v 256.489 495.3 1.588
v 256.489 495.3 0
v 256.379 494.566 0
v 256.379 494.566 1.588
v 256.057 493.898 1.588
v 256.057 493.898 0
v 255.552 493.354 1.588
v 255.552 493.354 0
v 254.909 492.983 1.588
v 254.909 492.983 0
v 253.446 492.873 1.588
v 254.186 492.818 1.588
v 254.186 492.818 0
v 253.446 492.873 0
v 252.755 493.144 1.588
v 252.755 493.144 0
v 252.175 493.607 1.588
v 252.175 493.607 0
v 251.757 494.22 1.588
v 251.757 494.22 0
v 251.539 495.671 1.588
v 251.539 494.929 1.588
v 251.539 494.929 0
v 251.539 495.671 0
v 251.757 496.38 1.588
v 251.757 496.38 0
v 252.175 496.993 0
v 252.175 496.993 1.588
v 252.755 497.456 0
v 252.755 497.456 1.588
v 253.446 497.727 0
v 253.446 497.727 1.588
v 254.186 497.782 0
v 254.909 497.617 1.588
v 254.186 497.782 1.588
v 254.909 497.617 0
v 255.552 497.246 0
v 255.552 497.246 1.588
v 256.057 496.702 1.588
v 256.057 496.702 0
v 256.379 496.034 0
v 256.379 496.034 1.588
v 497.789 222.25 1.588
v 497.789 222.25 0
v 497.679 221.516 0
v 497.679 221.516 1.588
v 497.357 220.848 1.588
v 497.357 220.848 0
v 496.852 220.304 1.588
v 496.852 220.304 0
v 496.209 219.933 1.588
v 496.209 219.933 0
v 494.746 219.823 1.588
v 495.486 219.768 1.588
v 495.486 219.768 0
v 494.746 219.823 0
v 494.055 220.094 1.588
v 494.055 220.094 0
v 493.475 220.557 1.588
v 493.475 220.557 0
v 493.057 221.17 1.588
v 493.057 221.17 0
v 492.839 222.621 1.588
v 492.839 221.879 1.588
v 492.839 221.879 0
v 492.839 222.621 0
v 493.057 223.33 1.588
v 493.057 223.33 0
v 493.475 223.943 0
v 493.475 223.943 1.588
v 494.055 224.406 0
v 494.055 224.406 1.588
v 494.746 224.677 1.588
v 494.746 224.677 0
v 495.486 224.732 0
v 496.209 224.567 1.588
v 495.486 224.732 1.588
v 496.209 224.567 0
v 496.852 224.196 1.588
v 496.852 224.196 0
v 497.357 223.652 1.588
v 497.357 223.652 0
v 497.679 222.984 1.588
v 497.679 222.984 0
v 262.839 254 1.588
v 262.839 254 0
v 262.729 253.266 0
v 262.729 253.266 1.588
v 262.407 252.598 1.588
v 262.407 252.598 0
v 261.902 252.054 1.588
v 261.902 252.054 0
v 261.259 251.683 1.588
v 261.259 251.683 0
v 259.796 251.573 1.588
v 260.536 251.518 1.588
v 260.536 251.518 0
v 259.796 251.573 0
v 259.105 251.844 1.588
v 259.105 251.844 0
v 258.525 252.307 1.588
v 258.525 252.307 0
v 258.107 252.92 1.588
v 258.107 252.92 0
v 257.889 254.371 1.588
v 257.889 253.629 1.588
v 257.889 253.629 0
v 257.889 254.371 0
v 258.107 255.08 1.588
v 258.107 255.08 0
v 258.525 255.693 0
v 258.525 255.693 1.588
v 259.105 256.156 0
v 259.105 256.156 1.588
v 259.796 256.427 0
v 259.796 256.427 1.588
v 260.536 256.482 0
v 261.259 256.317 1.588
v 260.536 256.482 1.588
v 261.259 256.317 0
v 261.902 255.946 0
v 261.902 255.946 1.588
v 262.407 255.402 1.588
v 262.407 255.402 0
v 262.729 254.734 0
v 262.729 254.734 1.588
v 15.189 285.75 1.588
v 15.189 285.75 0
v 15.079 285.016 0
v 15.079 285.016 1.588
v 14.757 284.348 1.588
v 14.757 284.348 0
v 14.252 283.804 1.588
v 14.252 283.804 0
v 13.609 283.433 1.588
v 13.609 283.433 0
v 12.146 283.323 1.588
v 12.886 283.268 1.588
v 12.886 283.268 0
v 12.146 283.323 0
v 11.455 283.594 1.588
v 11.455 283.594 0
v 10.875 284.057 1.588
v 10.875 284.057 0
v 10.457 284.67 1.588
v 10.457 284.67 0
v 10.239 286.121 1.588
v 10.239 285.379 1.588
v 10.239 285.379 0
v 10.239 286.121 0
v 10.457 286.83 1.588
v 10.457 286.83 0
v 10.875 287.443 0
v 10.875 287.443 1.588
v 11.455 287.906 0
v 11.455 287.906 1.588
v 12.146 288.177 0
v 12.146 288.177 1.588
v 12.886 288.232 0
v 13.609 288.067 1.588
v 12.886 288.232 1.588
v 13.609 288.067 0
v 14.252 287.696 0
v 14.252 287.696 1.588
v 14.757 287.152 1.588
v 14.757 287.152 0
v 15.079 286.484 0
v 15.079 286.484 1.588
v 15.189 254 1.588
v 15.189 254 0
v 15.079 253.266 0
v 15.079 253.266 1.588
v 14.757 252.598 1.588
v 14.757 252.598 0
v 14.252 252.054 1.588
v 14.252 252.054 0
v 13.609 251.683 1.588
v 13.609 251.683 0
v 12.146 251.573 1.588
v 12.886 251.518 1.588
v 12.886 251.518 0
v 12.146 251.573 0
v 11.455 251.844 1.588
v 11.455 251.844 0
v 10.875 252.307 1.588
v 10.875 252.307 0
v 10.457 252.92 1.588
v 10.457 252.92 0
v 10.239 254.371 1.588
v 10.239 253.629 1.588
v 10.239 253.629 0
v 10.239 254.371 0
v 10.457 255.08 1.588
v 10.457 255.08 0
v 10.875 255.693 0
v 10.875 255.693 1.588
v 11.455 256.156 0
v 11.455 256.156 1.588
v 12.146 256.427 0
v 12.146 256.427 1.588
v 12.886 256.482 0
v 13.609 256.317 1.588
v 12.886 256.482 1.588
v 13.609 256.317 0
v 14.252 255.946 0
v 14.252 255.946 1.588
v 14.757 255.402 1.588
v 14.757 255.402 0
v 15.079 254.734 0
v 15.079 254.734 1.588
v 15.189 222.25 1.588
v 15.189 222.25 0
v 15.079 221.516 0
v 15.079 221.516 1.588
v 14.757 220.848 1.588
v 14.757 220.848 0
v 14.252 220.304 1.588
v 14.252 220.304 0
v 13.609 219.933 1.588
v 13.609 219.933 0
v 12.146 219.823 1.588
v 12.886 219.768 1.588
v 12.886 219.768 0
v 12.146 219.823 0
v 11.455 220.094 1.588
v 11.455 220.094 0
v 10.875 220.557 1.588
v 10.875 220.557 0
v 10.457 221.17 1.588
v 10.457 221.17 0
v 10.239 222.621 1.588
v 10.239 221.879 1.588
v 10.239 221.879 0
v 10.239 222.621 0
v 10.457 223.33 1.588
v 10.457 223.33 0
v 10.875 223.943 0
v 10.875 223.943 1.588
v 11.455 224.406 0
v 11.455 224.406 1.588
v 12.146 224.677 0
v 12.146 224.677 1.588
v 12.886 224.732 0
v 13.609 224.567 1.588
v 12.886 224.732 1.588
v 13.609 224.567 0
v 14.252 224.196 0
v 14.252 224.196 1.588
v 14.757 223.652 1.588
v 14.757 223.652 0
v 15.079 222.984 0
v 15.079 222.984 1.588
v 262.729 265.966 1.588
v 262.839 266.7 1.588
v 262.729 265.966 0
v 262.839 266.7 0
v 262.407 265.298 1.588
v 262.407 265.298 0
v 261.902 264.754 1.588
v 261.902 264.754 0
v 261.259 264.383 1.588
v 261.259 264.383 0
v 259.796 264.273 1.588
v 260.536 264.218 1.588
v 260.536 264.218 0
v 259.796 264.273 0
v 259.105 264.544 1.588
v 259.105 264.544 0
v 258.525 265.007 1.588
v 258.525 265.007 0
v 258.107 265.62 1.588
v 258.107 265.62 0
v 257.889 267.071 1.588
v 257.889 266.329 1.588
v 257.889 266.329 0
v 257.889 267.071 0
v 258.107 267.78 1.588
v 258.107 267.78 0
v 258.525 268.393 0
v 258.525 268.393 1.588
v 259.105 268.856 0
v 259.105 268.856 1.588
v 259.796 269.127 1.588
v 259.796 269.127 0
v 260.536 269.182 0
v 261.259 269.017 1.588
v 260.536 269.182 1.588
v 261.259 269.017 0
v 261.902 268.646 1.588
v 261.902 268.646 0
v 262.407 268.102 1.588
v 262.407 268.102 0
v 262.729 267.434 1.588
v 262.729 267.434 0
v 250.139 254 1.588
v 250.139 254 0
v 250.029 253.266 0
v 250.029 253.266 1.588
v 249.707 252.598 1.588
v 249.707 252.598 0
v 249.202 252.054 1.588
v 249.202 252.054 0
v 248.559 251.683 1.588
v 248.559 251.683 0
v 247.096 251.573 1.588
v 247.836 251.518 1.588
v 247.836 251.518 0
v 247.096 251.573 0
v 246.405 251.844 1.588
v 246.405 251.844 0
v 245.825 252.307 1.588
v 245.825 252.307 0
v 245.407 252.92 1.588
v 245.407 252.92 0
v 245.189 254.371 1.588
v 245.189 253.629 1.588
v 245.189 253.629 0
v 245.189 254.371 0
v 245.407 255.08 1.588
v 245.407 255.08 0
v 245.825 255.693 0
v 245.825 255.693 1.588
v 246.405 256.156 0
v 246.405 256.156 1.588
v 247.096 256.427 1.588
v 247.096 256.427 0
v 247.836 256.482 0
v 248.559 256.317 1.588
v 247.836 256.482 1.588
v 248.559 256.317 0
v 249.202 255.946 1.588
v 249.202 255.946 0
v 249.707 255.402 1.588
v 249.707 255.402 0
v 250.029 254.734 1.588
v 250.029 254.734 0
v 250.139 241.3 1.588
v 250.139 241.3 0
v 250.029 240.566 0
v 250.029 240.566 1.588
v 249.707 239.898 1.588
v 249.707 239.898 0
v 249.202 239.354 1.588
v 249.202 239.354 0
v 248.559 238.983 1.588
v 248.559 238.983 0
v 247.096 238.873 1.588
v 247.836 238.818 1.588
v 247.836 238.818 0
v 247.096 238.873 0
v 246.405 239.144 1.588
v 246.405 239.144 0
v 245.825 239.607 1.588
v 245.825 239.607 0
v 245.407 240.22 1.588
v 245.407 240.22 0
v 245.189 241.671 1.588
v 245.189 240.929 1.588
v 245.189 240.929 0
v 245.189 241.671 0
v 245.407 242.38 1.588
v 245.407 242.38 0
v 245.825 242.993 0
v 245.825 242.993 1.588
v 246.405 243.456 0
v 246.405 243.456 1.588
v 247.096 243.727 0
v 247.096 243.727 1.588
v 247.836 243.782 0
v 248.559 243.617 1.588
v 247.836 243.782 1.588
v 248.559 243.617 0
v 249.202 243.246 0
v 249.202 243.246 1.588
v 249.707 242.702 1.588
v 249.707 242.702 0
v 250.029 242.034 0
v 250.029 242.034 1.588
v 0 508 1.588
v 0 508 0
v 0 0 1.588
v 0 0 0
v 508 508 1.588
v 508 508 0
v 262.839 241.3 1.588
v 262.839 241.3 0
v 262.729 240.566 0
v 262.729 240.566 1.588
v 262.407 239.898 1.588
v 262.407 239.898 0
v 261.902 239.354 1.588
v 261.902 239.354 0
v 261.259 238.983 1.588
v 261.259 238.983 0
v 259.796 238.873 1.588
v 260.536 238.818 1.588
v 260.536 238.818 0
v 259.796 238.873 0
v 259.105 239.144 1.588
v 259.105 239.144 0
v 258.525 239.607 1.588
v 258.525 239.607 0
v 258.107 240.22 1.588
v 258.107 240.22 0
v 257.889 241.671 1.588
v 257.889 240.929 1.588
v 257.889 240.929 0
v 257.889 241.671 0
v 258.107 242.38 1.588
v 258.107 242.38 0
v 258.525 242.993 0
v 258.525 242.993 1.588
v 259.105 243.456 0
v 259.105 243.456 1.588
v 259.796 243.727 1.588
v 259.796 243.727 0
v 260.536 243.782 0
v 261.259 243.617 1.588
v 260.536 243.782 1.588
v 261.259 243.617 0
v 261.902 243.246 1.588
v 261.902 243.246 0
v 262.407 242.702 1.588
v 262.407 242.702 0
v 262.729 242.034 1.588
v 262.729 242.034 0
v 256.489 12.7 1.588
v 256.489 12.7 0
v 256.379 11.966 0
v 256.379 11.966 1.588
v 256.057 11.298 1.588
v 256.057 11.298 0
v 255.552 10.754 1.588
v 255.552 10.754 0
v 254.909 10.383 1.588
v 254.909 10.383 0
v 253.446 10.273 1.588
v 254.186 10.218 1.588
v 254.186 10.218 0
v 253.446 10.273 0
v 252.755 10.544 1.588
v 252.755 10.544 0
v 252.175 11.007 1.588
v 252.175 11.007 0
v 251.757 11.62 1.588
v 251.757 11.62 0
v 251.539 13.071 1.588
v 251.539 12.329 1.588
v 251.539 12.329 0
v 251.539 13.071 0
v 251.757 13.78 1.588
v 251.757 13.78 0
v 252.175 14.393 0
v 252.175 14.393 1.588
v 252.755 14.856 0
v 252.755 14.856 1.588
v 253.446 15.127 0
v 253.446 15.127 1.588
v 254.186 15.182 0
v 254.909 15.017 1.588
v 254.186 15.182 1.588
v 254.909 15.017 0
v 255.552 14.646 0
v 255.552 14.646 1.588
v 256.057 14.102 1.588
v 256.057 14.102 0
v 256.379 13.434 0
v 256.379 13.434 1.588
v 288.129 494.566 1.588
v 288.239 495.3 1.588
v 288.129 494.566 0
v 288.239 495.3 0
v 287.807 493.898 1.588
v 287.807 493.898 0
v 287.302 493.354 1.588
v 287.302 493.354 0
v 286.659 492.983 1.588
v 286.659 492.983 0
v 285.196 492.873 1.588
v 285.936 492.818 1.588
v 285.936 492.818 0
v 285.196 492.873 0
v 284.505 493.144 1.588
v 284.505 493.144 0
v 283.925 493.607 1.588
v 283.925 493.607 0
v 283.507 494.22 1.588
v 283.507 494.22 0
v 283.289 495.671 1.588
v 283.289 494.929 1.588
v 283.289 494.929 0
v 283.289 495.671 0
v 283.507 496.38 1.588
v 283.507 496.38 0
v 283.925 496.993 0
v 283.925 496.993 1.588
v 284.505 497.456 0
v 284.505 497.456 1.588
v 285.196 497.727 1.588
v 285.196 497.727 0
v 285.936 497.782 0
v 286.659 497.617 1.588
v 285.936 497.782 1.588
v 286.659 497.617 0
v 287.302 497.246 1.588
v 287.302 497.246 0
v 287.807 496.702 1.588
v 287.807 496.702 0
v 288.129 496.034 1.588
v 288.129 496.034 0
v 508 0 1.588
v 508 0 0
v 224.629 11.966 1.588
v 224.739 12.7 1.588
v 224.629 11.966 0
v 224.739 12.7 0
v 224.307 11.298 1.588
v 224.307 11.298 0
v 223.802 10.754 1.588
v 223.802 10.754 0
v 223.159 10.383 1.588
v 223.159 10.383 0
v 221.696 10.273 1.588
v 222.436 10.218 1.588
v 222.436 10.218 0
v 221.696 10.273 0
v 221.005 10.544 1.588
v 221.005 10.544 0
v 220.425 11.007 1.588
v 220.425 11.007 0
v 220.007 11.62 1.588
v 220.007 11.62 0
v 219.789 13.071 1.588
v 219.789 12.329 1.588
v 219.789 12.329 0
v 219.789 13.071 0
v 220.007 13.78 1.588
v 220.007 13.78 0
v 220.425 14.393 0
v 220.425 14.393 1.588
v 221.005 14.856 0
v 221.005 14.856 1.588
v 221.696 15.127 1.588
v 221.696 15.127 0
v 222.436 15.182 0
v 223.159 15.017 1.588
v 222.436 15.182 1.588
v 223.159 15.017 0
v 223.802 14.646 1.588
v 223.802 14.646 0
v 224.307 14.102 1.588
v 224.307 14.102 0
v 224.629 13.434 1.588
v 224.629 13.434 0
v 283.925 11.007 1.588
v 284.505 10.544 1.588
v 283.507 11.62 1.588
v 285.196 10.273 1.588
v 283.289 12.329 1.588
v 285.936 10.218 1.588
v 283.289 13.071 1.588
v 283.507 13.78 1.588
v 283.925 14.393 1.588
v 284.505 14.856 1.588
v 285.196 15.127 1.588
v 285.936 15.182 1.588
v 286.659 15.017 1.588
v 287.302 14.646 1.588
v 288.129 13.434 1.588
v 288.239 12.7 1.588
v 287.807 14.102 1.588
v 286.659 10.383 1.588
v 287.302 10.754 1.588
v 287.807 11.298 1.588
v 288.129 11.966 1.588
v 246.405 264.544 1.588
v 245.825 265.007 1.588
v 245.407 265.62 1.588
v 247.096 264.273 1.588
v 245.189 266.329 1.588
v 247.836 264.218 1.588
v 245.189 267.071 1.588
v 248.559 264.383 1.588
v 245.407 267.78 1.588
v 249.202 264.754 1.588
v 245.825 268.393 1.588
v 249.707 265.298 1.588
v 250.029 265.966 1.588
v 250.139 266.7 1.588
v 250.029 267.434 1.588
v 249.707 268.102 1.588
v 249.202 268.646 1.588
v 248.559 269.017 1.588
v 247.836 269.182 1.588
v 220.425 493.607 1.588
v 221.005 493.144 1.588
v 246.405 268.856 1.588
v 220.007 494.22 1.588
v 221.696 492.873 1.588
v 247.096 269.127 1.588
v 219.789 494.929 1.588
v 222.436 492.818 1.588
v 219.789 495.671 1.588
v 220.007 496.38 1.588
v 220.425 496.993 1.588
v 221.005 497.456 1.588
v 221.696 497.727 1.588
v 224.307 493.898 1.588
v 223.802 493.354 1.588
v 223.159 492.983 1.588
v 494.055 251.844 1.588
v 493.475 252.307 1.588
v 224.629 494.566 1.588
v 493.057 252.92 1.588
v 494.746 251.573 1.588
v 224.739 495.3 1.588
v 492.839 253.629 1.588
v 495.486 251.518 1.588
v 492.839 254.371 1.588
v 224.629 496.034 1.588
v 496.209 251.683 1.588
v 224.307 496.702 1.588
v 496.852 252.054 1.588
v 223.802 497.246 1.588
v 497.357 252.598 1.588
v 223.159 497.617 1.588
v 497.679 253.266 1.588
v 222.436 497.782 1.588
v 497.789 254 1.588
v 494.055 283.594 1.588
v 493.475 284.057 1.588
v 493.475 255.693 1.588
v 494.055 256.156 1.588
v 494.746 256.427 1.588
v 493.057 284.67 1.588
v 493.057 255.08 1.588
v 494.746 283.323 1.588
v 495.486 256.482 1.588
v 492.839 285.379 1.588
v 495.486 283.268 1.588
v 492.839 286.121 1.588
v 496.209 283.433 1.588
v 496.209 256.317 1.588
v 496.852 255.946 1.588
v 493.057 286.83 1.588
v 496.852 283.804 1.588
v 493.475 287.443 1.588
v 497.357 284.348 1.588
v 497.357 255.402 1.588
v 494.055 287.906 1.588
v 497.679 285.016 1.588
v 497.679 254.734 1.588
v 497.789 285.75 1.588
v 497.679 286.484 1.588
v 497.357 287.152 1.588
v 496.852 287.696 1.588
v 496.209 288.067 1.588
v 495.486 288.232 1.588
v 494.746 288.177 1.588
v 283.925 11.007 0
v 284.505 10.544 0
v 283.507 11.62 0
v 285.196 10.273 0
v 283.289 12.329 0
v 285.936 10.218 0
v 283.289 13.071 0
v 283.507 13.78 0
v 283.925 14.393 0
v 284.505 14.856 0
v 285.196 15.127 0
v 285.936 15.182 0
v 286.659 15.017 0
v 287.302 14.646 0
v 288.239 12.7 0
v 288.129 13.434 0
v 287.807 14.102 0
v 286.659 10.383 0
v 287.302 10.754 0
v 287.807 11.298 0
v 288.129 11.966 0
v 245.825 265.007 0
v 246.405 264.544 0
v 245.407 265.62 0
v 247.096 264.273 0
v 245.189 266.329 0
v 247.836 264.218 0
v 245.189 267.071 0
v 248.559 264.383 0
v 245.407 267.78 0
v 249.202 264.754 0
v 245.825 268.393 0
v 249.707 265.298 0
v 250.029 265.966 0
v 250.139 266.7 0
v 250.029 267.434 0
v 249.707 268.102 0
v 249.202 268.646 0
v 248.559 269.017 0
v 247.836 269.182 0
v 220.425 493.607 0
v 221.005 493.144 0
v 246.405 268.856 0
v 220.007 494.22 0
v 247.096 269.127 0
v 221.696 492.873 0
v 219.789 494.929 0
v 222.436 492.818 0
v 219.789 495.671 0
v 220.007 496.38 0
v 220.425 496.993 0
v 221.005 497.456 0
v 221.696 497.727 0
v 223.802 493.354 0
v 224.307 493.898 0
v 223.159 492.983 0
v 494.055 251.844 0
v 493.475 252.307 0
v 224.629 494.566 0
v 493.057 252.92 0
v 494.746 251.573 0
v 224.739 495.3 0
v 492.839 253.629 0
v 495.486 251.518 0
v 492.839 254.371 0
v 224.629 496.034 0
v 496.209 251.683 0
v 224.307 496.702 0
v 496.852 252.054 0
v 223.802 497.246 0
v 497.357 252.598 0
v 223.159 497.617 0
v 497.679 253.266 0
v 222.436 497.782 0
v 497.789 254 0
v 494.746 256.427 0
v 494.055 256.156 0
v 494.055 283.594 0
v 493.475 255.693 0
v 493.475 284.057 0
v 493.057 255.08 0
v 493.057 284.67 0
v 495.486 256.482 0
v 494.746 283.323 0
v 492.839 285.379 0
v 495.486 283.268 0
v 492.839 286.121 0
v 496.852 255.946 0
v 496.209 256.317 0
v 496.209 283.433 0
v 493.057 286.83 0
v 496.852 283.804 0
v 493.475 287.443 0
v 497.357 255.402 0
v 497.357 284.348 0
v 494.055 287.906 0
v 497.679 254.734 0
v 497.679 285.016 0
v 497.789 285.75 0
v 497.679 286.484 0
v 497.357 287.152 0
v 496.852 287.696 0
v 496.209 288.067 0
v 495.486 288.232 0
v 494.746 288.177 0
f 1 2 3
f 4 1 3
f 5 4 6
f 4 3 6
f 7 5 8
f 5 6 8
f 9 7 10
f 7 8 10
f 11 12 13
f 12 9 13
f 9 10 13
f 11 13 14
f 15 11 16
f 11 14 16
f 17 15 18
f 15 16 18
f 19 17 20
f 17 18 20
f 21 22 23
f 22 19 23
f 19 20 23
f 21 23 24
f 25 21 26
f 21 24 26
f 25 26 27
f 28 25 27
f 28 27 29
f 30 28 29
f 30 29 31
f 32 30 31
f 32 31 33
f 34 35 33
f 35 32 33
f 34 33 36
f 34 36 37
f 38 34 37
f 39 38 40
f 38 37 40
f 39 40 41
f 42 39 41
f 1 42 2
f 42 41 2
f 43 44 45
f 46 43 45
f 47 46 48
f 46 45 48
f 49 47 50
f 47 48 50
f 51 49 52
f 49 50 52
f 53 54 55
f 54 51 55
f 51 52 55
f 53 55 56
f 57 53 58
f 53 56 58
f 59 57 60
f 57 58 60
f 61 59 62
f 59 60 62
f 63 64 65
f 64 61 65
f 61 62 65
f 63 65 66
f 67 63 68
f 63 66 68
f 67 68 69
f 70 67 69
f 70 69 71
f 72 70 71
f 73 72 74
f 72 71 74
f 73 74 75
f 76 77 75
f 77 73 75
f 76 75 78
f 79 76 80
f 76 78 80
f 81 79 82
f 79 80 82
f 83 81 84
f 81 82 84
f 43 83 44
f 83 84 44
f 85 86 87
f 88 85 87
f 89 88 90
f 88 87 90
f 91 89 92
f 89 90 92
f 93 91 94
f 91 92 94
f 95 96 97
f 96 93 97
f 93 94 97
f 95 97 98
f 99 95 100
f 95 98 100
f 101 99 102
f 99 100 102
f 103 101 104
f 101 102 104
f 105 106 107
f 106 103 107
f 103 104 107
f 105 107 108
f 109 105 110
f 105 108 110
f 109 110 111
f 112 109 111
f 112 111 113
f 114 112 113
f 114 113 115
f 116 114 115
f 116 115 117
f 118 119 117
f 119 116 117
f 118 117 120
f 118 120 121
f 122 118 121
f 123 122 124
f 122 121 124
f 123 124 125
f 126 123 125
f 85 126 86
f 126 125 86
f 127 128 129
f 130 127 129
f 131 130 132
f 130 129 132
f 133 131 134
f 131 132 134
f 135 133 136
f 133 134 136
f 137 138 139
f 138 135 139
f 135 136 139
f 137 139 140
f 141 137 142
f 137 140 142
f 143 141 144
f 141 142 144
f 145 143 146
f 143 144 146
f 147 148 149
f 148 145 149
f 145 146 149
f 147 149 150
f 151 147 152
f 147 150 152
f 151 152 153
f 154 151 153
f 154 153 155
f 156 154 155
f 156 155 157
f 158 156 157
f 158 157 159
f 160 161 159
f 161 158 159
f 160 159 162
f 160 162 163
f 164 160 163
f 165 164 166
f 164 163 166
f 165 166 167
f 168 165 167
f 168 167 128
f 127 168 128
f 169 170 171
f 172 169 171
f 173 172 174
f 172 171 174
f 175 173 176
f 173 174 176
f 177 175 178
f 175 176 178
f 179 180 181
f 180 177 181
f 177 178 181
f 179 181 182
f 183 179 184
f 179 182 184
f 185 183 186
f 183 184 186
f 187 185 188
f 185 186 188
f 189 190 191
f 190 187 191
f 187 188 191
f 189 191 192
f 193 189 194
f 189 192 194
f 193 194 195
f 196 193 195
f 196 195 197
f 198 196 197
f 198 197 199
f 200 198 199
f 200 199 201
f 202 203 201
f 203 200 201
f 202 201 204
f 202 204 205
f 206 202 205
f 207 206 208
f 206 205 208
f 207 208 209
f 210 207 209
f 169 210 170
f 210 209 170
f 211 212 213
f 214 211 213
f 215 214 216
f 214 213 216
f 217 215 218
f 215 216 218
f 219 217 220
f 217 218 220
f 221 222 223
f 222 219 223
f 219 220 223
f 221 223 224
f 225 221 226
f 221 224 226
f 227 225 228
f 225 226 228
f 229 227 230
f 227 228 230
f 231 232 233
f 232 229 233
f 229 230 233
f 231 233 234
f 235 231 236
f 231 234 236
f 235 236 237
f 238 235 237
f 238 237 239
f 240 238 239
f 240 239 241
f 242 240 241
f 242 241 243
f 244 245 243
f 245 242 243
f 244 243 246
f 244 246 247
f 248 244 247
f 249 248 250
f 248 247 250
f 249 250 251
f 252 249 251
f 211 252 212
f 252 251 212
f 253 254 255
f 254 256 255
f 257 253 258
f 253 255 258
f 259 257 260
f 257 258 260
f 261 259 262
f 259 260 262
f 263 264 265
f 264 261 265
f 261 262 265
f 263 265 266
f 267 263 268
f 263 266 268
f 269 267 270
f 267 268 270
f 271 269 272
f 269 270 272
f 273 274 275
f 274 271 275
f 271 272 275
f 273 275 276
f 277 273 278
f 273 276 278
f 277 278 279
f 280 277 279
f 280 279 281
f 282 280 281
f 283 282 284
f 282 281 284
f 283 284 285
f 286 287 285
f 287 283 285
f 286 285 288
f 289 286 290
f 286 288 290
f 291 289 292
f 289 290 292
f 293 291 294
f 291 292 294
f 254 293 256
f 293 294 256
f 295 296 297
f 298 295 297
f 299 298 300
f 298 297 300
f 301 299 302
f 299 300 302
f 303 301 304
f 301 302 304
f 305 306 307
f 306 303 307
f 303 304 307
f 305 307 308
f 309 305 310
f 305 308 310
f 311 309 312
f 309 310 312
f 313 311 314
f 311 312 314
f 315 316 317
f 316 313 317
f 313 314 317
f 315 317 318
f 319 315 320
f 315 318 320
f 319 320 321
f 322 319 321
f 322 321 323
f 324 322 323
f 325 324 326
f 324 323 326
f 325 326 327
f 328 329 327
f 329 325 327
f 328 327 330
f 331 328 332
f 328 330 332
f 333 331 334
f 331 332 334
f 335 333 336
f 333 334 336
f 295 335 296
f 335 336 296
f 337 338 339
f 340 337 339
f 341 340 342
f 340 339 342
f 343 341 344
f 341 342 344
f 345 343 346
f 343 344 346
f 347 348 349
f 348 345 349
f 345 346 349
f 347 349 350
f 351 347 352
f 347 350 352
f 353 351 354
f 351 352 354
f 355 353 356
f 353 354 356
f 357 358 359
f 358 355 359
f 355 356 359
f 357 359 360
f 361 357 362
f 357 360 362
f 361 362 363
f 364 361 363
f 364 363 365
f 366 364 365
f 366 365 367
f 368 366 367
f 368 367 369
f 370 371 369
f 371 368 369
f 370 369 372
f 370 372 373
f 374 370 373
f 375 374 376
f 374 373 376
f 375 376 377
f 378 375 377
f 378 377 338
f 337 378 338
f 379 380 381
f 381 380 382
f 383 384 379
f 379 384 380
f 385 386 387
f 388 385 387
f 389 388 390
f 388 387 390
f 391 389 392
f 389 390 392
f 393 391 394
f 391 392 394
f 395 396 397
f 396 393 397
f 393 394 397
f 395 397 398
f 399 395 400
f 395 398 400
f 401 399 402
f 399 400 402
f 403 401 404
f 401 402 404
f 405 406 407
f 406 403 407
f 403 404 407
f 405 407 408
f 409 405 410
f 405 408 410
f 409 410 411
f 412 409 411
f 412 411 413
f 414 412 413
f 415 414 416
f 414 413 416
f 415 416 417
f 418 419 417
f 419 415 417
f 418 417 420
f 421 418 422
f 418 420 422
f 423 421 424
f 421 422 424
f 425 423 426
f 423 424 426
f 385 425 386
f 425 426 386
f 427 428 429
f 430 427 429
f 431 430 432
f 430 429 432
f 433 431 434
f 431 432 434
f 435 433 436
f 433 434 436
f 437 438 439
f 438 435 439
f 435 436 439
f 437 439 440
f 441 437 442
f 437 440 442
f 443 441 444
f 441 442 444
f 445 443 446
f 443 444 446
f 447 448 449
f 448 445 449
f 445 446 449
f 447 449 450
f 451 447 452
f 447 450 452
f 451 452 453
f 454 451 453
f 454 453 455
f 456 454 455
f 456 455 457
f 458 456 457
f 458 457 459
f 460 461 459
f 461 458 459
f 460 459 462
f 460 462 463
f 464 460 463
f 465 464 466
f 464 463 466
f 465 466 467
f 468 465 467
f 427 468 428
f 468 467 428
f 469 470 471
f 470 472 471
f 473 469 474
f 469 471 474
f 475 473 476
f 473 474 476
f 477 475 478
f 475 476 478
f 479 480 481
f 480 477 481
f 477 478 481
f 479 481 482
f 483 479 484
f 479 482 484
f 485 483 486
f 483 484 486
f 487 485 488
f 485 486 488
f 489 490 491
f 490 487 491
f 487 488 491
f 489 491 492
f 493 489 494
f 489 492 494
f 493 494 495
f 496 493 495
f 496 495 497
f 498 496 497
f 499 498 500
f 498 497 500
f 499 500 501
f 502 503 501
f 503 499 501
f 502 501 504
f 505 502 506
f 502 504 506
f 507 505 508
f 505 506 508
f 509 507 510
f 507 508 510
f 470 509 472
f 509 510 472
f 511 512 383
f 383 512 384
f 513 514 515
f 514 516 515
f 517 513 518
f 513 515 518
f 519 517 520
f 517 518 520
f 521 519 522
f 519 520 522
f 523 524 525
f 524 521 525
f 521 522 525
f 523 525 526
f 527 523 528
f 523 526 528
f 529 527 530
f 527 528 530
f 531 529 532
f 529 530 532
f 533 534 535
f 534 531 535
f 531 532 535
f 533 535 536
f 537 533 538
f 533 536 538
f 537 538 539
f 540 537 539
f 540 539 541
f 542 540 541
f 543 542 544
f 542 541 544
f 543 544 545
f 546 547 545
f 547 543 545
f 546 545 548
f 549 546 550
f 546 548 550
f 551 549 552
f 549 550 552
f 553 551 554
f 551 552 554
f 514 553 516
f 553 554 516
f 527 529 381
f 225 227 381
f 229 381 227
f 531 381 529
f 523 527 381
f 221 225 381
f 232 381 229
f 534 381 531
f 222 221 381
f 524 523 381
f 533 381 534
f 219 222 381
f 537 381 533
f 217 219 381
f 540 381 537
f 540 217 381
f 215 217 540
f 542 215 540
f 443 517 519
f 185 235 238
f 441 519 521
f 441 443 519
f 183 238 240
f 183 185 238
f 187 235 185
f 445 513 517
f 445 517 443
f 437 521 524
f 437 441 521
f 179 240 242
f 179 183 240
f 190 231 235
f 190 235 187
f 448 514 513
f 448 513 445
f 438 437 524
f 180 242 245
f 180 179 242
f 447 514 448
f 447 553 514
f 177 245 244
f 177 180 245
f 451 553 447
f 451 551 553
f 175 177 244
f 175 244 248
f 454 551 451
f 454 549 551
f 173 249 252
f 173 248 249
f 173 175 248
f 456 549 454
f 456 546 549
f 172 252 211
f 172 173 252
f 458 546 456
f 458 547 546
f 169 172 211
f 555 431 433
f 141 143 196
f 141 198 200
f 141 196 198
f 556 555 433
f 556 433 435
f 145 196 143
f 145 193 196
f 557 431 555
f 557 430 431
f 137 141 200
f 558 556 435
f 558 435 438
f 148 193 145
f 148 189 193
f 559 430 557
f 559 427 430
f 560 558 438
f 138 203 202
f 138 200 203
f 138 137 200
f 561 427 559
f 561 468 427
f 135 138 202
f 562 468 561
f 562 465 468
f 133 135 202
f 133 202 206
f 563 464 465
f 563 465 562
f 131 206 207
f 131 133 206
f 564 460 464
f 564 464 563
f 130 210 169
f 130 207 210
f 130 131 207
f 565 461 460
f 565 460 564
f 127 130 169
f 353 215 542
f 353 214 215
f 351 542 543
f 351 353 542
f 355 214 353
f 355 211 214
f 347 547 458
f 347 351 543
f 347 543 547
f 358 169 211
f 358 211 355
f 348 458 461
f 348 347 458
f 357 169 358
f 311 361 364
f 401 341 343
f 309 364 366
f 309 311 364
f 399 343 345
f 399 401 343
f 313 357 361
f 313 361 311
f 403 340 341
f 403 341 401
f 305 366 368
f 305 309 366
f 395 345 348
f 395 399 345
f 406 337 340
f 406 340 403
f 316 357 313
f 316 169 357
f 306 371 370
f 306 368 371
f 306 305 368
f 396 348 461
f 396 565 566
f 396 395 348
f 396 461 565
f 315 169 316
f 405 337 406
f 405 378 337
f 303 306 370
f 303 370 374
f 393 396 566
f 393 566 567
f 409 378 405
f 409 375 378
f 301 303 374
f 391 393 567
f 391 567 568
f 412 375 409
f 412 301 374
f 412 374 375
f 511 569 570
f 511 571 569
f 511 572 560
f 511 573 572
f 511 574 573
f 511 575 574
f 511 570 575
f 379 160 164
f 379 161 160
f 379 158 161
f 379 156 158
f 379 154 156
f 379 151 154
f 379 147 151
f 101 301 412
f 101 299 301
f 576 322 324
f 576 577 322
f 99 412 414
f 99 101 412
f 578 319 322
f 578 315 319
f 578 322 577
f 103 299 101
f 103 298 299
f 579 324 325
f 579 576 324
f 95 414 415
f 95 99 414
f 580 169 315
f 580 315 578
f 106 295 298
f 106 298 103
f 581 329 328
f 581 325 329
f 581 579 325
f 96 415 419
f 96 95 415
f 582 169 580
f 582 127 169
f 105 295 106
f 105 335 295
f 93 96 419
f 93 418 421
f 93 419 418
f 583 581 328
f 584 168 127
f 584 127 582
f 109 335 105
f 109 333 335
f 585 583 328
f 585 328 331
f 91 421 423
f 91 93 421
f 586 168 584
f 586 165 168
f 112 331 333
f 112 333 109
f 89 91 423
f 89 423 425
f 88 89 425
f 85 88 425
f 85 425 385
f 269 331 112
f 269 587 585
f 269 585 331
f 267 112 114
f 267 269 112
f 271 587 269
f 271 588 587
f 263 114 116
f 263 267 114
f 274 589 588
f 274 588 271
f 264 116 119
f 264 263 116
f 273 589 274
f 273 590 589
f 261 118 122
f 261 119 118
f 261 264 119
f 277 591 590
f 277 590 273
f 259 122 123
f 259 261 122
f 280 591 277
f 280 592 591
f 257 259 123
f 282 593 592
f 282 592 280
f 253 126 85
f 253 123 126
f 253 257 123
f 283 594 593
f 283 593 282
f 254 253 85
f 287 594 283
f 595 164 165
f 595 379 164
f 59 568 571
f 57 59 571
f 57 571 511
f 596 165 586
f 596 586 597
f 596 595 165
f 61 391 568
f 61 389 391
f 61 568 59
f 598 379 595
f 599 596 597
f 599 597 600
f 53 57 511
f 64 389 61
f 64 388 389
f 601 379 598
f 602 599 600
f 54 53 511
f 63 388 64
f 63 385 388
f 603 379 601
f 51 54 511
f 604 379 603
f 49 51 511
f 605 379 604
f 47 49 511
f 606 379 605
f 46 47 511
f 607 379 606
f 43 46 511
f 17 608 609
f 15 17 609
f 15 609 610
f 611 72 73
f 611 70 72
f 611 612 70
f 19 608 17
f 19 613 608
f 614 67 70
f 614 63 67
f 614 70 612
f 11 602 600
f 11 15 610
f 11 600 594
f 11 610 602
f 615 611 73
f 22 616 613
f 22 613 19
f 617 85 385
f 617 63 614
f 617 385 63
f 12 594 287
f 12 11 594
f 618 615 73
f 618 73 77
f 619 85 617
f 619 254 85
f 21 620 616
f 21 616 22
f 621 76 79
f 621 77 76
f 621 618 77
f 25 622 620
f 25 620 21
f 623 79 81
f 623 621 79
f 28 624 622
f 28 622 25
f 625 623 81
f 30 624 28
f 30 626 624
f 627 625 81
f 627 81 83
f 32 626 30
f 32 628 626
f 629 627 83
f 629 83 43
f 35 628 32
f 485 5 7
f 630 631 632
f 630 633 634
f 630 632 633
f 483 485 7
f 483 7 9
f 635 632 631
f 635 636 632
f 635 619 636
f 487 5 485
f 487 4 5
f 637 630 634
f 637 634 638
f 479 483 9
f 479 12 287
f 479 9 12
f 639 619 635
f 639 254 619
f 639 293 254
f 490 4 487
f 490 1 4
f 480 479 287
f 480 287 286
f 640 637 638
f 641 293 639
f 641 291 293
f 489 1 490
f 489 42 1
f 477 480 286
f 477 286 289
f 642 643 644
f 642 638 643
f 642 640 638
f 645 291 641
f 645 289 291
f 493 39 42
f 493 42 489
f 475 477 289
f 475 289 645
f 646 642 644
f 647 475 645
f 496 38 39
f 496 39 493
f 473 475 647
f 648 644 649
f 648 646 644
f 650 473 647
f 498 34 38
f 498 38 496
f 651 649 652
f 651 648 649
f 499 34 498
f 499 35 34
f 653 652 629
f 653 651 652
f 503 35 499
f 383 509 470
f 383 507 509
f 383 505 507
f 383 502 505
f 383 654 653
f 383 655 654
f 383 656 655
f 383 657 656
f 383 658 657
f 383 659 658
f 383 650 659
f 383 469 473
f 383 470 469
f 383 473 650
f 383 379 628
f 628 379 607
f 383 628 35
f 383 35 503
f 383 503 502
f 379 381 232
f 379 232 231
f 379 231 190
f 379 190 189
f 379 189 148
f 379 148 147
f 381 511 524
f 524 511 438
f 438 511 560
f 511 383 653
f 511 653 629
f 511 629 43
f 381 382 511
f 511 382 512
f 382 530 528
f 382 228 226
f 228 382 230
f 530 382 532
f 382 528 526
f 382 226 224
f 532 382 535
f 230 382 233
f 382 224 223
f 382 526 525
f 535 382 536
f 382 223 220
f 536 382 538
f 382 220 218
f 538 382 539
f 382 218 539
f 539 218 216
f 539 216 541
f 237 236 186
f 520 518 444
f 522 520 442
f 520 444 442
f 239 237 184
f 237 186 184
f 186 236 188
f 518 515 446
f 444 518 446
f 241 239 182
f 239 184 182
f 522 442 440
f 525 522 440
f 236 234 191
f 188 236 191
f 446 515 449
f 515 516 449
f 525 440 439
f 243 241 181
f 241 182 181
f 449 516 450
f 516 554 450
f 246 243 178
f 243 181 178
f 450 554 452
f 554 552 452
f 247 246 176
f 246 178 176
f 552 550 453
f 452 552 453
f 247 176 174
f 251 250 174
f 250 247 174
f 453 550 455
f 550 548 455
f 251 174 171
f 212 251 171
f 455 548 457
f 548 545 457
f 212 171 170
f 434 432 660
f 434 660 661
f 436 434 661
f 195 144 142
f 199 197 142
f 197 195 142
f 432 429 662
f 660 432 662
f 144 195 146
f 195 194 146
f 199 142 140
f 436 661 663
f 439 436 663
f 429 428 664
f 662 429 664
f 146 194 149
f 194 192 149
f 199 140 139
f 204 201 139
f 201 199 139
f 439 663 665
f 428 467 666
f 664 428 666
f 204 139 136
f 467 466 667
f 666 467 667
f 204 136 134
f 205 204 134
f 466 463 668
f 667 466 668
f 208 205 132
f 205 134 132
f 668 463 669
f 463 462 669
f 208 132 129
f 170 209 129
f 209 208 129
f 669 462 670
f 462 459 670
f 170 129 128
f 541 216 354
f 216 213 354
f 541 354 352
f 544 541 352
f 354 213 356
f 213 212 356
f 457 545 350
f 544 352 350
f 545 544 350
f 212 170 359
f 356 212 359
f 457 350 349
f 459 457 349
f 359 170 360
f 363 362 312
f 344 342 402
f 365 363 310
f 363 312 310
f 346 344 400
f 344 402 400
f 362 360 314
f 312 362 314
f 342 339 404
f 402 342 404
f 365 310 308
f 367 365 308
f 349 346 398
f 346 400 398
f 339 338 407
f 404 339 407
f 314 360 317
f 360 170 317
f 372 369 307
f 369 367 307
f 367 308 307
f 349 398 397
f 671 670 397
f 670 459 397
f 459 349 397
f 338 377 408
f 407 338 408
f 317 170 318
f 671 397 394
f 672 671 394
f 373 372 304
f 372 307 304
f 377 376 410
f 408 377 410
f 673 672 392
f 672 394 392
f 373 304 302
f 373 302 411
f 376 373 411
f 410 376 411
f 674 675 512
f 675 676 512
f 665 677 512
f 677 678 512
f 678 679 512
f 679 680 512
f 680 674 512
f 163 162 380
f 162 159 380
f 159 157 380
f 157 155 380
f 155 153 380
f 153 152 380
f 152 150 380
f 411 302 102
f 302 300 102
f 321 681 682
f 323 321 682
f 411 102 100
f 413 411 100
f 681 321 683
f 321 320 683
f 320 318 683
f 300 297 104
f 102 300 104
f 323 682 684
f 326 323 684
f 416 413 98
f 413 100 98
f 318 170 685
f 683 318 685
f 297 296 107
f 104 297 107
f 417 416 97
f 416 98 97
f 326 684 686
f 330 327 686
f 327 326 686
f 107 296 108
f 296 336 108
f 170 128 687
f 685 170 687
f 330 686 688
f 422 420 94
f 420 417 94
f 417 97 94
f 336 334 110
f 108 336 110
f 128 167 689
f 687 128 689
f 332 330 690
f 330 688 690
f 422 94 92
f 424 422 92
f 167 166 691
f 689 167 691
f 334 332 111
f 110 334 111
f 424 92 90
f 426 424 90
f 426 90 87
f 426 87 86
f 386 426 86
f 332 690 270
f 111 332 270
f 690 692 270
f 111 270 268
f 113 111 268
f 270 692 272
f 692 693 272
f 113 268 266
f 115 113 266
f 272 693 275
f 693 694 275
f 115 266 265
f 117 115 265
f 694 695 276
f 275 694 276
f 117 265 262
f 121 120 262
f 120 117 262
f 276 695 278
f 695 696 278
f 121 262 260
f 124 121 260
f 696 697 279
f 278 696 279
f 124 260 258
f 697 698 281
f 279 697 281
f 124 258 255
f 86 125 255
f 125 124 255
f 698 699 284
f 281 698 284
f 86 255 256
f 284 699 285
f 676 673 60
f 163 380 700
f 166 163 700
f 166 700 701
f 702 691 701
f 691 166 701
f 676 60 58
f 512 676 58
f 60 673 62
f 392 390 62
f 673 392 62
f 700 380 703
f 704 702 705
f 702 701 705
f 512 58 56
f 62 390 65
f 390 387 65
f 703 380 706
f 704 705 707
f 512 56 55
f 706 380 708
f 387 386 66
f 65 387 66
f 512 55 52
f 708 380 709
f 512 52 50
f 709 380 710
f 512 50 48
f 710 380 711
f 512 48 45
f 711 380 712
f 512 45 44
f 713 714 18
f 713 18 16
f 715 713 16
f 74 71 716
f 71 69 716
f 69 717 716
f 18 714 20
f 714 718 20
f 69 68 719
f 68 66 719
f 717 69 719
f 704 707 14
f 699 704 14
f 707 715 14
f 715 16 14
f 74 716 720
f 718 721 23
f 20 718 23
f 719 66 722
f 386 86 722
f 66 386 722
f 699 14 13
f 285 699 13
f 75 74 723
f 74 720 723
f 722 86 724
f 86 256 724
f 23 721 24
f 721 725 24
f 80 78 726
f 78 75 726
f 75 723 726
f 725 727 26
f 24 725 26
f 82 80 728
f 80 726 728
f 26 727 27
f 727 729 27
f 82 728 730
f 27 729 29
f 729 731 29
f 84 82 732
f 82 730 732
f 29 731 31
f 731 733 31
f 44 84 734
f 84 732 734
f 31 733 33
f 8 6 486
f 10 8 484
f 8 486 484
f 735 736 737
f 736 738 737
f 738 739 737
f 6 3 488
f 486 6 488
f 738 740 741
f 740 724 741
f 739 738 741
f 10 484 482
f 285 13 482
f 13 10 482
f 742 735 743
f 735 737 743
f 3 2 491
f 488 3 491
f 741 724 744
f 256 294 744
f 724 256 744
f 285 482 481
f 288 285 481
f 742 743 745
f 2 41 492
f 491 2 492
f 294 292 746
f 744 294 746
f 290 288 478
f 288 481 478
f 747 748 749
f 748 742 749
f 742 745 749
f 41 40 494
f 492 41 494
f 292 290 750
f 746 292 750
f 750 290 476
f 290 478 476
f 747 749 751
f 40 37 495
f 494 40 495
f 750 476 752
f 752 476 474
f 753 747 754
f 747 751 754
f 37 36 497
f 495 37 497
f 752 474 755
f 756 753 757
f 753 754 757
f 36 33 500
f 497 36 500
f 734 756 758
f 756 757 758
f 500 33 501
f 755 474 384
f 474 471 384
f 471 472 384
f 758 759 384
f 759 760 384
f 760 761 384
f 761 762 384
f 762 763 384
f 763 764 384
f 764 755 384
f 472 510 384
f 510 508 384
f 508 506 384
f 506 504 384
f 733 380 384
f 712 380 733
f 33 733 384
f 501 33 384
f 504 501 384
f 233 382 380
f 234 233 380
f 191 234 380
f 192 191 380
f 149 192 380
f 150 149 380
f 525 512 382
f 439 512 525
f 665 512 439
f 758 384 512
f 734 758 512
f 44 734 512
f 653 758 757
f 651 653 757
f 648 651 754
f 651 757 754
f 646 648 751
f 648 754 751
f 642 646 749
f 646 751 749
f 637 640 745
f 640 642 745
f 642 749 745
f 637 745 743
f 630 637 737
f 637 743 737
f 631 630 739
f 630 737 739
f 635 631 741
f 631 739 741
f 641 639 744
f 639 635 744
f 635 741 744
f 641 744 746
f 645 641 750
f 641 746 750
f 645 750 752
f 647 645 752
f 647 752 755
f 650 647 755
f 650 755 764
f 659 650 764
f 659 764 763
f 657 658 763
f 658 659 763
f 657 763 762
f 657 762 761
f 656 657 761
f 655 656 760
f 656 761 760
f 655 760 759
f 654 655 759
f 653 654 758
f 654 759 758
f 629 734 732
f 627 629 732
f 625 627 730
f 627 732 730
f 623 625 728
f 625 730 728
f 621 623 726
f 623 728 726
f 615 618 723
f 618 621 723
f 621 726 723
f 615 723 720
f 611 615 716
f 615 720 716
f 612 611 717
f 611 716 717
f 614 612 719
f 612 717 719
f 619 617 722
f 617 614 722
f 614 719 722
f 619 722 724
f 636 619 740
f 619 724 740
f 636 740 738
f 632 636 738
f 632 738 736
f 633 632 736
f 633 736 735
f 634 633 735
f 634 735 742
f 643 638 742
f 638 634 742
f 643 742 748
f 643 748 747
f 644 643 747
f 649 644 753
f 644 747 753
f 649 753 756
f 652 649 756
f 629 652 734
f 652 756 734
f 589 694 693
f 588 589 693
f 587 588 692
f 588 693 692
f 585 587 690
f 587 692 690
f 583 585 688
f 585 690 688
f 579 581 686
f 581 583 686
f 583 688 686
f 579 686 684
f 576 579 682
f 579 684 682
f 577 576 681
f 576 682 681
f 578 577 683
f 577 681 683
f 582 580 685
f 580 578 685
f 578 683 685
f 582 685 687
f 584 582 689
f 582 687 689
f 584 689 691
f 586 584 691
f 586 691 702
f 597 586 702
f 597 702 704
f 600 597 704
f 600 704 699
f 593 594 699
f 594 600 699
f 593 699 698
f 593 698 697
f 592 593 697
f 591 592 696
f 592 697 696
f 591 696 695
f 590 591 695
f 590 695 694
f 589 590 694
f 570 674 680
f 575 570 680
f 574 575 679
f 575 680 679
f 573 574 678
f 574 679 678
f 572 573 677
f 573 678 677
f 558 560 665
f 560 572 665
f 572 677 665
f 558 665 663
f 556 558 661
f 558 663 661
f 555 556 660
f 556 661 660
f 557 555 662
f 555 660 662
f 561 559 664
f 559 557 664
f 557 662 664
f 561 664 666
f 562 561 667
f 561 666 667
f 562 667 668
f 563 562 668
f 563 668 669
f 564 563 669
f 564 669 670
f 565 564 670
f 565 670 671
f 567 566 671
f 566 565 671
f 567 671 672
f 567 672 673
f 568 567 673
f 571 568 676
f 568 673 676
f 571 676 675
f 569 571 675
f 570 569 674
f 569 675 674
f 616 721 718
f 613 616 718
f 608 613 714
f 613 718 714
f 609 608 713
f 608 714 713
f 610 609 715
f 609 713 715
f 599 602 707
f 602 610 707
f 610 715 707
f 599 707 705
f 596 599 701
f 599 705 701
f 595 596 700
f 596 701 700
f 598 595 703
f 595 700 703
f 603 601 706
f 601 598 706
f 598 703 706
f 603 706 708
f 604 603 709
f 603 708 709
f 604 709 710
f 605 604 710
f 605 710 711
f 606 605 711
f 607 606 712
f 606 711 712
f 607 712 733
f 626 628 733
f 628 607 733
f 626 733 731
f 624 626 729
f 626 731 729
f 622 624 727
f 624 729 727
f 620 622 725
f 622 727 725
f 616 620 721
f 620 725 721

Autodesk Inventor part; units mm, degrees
ref_plane "YZ Plane" through (0, 0, 0) normal (1, 0, 0) x (0, 1, 0)
ref_plane "XZ Plane" through (0, 0, 0) normal (0, 1, 0) x (-1, 0, 0)
ref_plane "XY Plane" through (0, 0, 0) normal (0, 0, 1) x (1, 0, 0)
sketch "Sketch1" plane through (0, 0, 0) normal (0, 0, 1) x (1, 0, 0)
  line L0 (0, 0) -> (508, 0)
  line L1 (508, 0) -> (508, 508)
  line L2 (508, 508) -> (0, 508)
  line L3 (0, 508) -> (0, 0)
  line L4 (0, 254) -> (508, 254) construction
  line L5 (254, 508) -> (254, 0) construction
  line L6 (241.3, 273.05) -> (266.7, 273.05) construction
  line L7 (266.7, 273.05) -> (266.7, 234.95) construction
  line L8 (266.7, 234.95) -> (241.3, 234.95) construction
  line L9 (241.3, 234.95) -> (241.3, 273.05) construction
  circle A0 centre (247.65, 266.7) radius 2.4892
  circle A1 centre (260.35, 266.7) radius 2.4892
  circle A2 centre (247.65, 254) radius 2.4892
  circle A3 centre (260.35, 254) radius 2.4892
  circle A4 centre (247.65, 241.3) radius 2.4892
  circle A5 centre (260.35, 241.3) radius 2.4892
  line L10 (0, 215.9) -> (19.05, 215.9) construction
  line L11 (19.05, 215.9) -> (19.05, 292.1) construction
  line L12 (19.05, 292.1) -> (0, 292.1) construction
  line L13 (0, 292.1) -> (0, 215.9) construction
  circle A6 centre (12.7, 285.75) radius 2.4892
  circle A7 centre (12.7, 222.25) radius 2.4892
  circle A8 centre (12.7, 254) radius 2.4892
  circle A9 centre (222.25, 12.7) radius 2.4892
  circle A10 centre (285.75, 12.7) radius 2.4892
  circle A11 centre (254, 12.7) radius 2.4892
  circle A12 centre (495.3, 222.25) radius 2.4892
  circle A13 centre (495.3, 285.75) radius 2.4892
  circle A14 centre (495.3, 254) radius 2.4892
  circle A15 centre (285.75, 495.3) radius 2.4892
  circle A16 centre (222.25, 495.3) radius 2.4892
  circle A17 centre (254, 495.3) radius 2.4892
  point P0 (254, 254)
  dimension "d0" = 508
  dimension "d1" = 508
  dimension "d18" = 25.4
  dimension "d19" = 38.1
  dimension "d20" = 4.9784
  dimension "d21" = 6.35
  dimension "d22" = 6.35
  dimension "d25" = 12.7
  dimension "d28" = 12.7
  dimension "d31" = 19.05
  dimension "d32" = 76.2
  dimension "d33" = 4.9784
  dimension "d34" = 6.35
  dimension "d35" = 6.35
  dimension "d36" = 6.35
  dimension "d39" = 360
extrude "Extrusion1" add sketch "Sketch1" along normal blind 1.5875
properties part number "Back Funnel Piece" material "Polycarbonate, Clear"
